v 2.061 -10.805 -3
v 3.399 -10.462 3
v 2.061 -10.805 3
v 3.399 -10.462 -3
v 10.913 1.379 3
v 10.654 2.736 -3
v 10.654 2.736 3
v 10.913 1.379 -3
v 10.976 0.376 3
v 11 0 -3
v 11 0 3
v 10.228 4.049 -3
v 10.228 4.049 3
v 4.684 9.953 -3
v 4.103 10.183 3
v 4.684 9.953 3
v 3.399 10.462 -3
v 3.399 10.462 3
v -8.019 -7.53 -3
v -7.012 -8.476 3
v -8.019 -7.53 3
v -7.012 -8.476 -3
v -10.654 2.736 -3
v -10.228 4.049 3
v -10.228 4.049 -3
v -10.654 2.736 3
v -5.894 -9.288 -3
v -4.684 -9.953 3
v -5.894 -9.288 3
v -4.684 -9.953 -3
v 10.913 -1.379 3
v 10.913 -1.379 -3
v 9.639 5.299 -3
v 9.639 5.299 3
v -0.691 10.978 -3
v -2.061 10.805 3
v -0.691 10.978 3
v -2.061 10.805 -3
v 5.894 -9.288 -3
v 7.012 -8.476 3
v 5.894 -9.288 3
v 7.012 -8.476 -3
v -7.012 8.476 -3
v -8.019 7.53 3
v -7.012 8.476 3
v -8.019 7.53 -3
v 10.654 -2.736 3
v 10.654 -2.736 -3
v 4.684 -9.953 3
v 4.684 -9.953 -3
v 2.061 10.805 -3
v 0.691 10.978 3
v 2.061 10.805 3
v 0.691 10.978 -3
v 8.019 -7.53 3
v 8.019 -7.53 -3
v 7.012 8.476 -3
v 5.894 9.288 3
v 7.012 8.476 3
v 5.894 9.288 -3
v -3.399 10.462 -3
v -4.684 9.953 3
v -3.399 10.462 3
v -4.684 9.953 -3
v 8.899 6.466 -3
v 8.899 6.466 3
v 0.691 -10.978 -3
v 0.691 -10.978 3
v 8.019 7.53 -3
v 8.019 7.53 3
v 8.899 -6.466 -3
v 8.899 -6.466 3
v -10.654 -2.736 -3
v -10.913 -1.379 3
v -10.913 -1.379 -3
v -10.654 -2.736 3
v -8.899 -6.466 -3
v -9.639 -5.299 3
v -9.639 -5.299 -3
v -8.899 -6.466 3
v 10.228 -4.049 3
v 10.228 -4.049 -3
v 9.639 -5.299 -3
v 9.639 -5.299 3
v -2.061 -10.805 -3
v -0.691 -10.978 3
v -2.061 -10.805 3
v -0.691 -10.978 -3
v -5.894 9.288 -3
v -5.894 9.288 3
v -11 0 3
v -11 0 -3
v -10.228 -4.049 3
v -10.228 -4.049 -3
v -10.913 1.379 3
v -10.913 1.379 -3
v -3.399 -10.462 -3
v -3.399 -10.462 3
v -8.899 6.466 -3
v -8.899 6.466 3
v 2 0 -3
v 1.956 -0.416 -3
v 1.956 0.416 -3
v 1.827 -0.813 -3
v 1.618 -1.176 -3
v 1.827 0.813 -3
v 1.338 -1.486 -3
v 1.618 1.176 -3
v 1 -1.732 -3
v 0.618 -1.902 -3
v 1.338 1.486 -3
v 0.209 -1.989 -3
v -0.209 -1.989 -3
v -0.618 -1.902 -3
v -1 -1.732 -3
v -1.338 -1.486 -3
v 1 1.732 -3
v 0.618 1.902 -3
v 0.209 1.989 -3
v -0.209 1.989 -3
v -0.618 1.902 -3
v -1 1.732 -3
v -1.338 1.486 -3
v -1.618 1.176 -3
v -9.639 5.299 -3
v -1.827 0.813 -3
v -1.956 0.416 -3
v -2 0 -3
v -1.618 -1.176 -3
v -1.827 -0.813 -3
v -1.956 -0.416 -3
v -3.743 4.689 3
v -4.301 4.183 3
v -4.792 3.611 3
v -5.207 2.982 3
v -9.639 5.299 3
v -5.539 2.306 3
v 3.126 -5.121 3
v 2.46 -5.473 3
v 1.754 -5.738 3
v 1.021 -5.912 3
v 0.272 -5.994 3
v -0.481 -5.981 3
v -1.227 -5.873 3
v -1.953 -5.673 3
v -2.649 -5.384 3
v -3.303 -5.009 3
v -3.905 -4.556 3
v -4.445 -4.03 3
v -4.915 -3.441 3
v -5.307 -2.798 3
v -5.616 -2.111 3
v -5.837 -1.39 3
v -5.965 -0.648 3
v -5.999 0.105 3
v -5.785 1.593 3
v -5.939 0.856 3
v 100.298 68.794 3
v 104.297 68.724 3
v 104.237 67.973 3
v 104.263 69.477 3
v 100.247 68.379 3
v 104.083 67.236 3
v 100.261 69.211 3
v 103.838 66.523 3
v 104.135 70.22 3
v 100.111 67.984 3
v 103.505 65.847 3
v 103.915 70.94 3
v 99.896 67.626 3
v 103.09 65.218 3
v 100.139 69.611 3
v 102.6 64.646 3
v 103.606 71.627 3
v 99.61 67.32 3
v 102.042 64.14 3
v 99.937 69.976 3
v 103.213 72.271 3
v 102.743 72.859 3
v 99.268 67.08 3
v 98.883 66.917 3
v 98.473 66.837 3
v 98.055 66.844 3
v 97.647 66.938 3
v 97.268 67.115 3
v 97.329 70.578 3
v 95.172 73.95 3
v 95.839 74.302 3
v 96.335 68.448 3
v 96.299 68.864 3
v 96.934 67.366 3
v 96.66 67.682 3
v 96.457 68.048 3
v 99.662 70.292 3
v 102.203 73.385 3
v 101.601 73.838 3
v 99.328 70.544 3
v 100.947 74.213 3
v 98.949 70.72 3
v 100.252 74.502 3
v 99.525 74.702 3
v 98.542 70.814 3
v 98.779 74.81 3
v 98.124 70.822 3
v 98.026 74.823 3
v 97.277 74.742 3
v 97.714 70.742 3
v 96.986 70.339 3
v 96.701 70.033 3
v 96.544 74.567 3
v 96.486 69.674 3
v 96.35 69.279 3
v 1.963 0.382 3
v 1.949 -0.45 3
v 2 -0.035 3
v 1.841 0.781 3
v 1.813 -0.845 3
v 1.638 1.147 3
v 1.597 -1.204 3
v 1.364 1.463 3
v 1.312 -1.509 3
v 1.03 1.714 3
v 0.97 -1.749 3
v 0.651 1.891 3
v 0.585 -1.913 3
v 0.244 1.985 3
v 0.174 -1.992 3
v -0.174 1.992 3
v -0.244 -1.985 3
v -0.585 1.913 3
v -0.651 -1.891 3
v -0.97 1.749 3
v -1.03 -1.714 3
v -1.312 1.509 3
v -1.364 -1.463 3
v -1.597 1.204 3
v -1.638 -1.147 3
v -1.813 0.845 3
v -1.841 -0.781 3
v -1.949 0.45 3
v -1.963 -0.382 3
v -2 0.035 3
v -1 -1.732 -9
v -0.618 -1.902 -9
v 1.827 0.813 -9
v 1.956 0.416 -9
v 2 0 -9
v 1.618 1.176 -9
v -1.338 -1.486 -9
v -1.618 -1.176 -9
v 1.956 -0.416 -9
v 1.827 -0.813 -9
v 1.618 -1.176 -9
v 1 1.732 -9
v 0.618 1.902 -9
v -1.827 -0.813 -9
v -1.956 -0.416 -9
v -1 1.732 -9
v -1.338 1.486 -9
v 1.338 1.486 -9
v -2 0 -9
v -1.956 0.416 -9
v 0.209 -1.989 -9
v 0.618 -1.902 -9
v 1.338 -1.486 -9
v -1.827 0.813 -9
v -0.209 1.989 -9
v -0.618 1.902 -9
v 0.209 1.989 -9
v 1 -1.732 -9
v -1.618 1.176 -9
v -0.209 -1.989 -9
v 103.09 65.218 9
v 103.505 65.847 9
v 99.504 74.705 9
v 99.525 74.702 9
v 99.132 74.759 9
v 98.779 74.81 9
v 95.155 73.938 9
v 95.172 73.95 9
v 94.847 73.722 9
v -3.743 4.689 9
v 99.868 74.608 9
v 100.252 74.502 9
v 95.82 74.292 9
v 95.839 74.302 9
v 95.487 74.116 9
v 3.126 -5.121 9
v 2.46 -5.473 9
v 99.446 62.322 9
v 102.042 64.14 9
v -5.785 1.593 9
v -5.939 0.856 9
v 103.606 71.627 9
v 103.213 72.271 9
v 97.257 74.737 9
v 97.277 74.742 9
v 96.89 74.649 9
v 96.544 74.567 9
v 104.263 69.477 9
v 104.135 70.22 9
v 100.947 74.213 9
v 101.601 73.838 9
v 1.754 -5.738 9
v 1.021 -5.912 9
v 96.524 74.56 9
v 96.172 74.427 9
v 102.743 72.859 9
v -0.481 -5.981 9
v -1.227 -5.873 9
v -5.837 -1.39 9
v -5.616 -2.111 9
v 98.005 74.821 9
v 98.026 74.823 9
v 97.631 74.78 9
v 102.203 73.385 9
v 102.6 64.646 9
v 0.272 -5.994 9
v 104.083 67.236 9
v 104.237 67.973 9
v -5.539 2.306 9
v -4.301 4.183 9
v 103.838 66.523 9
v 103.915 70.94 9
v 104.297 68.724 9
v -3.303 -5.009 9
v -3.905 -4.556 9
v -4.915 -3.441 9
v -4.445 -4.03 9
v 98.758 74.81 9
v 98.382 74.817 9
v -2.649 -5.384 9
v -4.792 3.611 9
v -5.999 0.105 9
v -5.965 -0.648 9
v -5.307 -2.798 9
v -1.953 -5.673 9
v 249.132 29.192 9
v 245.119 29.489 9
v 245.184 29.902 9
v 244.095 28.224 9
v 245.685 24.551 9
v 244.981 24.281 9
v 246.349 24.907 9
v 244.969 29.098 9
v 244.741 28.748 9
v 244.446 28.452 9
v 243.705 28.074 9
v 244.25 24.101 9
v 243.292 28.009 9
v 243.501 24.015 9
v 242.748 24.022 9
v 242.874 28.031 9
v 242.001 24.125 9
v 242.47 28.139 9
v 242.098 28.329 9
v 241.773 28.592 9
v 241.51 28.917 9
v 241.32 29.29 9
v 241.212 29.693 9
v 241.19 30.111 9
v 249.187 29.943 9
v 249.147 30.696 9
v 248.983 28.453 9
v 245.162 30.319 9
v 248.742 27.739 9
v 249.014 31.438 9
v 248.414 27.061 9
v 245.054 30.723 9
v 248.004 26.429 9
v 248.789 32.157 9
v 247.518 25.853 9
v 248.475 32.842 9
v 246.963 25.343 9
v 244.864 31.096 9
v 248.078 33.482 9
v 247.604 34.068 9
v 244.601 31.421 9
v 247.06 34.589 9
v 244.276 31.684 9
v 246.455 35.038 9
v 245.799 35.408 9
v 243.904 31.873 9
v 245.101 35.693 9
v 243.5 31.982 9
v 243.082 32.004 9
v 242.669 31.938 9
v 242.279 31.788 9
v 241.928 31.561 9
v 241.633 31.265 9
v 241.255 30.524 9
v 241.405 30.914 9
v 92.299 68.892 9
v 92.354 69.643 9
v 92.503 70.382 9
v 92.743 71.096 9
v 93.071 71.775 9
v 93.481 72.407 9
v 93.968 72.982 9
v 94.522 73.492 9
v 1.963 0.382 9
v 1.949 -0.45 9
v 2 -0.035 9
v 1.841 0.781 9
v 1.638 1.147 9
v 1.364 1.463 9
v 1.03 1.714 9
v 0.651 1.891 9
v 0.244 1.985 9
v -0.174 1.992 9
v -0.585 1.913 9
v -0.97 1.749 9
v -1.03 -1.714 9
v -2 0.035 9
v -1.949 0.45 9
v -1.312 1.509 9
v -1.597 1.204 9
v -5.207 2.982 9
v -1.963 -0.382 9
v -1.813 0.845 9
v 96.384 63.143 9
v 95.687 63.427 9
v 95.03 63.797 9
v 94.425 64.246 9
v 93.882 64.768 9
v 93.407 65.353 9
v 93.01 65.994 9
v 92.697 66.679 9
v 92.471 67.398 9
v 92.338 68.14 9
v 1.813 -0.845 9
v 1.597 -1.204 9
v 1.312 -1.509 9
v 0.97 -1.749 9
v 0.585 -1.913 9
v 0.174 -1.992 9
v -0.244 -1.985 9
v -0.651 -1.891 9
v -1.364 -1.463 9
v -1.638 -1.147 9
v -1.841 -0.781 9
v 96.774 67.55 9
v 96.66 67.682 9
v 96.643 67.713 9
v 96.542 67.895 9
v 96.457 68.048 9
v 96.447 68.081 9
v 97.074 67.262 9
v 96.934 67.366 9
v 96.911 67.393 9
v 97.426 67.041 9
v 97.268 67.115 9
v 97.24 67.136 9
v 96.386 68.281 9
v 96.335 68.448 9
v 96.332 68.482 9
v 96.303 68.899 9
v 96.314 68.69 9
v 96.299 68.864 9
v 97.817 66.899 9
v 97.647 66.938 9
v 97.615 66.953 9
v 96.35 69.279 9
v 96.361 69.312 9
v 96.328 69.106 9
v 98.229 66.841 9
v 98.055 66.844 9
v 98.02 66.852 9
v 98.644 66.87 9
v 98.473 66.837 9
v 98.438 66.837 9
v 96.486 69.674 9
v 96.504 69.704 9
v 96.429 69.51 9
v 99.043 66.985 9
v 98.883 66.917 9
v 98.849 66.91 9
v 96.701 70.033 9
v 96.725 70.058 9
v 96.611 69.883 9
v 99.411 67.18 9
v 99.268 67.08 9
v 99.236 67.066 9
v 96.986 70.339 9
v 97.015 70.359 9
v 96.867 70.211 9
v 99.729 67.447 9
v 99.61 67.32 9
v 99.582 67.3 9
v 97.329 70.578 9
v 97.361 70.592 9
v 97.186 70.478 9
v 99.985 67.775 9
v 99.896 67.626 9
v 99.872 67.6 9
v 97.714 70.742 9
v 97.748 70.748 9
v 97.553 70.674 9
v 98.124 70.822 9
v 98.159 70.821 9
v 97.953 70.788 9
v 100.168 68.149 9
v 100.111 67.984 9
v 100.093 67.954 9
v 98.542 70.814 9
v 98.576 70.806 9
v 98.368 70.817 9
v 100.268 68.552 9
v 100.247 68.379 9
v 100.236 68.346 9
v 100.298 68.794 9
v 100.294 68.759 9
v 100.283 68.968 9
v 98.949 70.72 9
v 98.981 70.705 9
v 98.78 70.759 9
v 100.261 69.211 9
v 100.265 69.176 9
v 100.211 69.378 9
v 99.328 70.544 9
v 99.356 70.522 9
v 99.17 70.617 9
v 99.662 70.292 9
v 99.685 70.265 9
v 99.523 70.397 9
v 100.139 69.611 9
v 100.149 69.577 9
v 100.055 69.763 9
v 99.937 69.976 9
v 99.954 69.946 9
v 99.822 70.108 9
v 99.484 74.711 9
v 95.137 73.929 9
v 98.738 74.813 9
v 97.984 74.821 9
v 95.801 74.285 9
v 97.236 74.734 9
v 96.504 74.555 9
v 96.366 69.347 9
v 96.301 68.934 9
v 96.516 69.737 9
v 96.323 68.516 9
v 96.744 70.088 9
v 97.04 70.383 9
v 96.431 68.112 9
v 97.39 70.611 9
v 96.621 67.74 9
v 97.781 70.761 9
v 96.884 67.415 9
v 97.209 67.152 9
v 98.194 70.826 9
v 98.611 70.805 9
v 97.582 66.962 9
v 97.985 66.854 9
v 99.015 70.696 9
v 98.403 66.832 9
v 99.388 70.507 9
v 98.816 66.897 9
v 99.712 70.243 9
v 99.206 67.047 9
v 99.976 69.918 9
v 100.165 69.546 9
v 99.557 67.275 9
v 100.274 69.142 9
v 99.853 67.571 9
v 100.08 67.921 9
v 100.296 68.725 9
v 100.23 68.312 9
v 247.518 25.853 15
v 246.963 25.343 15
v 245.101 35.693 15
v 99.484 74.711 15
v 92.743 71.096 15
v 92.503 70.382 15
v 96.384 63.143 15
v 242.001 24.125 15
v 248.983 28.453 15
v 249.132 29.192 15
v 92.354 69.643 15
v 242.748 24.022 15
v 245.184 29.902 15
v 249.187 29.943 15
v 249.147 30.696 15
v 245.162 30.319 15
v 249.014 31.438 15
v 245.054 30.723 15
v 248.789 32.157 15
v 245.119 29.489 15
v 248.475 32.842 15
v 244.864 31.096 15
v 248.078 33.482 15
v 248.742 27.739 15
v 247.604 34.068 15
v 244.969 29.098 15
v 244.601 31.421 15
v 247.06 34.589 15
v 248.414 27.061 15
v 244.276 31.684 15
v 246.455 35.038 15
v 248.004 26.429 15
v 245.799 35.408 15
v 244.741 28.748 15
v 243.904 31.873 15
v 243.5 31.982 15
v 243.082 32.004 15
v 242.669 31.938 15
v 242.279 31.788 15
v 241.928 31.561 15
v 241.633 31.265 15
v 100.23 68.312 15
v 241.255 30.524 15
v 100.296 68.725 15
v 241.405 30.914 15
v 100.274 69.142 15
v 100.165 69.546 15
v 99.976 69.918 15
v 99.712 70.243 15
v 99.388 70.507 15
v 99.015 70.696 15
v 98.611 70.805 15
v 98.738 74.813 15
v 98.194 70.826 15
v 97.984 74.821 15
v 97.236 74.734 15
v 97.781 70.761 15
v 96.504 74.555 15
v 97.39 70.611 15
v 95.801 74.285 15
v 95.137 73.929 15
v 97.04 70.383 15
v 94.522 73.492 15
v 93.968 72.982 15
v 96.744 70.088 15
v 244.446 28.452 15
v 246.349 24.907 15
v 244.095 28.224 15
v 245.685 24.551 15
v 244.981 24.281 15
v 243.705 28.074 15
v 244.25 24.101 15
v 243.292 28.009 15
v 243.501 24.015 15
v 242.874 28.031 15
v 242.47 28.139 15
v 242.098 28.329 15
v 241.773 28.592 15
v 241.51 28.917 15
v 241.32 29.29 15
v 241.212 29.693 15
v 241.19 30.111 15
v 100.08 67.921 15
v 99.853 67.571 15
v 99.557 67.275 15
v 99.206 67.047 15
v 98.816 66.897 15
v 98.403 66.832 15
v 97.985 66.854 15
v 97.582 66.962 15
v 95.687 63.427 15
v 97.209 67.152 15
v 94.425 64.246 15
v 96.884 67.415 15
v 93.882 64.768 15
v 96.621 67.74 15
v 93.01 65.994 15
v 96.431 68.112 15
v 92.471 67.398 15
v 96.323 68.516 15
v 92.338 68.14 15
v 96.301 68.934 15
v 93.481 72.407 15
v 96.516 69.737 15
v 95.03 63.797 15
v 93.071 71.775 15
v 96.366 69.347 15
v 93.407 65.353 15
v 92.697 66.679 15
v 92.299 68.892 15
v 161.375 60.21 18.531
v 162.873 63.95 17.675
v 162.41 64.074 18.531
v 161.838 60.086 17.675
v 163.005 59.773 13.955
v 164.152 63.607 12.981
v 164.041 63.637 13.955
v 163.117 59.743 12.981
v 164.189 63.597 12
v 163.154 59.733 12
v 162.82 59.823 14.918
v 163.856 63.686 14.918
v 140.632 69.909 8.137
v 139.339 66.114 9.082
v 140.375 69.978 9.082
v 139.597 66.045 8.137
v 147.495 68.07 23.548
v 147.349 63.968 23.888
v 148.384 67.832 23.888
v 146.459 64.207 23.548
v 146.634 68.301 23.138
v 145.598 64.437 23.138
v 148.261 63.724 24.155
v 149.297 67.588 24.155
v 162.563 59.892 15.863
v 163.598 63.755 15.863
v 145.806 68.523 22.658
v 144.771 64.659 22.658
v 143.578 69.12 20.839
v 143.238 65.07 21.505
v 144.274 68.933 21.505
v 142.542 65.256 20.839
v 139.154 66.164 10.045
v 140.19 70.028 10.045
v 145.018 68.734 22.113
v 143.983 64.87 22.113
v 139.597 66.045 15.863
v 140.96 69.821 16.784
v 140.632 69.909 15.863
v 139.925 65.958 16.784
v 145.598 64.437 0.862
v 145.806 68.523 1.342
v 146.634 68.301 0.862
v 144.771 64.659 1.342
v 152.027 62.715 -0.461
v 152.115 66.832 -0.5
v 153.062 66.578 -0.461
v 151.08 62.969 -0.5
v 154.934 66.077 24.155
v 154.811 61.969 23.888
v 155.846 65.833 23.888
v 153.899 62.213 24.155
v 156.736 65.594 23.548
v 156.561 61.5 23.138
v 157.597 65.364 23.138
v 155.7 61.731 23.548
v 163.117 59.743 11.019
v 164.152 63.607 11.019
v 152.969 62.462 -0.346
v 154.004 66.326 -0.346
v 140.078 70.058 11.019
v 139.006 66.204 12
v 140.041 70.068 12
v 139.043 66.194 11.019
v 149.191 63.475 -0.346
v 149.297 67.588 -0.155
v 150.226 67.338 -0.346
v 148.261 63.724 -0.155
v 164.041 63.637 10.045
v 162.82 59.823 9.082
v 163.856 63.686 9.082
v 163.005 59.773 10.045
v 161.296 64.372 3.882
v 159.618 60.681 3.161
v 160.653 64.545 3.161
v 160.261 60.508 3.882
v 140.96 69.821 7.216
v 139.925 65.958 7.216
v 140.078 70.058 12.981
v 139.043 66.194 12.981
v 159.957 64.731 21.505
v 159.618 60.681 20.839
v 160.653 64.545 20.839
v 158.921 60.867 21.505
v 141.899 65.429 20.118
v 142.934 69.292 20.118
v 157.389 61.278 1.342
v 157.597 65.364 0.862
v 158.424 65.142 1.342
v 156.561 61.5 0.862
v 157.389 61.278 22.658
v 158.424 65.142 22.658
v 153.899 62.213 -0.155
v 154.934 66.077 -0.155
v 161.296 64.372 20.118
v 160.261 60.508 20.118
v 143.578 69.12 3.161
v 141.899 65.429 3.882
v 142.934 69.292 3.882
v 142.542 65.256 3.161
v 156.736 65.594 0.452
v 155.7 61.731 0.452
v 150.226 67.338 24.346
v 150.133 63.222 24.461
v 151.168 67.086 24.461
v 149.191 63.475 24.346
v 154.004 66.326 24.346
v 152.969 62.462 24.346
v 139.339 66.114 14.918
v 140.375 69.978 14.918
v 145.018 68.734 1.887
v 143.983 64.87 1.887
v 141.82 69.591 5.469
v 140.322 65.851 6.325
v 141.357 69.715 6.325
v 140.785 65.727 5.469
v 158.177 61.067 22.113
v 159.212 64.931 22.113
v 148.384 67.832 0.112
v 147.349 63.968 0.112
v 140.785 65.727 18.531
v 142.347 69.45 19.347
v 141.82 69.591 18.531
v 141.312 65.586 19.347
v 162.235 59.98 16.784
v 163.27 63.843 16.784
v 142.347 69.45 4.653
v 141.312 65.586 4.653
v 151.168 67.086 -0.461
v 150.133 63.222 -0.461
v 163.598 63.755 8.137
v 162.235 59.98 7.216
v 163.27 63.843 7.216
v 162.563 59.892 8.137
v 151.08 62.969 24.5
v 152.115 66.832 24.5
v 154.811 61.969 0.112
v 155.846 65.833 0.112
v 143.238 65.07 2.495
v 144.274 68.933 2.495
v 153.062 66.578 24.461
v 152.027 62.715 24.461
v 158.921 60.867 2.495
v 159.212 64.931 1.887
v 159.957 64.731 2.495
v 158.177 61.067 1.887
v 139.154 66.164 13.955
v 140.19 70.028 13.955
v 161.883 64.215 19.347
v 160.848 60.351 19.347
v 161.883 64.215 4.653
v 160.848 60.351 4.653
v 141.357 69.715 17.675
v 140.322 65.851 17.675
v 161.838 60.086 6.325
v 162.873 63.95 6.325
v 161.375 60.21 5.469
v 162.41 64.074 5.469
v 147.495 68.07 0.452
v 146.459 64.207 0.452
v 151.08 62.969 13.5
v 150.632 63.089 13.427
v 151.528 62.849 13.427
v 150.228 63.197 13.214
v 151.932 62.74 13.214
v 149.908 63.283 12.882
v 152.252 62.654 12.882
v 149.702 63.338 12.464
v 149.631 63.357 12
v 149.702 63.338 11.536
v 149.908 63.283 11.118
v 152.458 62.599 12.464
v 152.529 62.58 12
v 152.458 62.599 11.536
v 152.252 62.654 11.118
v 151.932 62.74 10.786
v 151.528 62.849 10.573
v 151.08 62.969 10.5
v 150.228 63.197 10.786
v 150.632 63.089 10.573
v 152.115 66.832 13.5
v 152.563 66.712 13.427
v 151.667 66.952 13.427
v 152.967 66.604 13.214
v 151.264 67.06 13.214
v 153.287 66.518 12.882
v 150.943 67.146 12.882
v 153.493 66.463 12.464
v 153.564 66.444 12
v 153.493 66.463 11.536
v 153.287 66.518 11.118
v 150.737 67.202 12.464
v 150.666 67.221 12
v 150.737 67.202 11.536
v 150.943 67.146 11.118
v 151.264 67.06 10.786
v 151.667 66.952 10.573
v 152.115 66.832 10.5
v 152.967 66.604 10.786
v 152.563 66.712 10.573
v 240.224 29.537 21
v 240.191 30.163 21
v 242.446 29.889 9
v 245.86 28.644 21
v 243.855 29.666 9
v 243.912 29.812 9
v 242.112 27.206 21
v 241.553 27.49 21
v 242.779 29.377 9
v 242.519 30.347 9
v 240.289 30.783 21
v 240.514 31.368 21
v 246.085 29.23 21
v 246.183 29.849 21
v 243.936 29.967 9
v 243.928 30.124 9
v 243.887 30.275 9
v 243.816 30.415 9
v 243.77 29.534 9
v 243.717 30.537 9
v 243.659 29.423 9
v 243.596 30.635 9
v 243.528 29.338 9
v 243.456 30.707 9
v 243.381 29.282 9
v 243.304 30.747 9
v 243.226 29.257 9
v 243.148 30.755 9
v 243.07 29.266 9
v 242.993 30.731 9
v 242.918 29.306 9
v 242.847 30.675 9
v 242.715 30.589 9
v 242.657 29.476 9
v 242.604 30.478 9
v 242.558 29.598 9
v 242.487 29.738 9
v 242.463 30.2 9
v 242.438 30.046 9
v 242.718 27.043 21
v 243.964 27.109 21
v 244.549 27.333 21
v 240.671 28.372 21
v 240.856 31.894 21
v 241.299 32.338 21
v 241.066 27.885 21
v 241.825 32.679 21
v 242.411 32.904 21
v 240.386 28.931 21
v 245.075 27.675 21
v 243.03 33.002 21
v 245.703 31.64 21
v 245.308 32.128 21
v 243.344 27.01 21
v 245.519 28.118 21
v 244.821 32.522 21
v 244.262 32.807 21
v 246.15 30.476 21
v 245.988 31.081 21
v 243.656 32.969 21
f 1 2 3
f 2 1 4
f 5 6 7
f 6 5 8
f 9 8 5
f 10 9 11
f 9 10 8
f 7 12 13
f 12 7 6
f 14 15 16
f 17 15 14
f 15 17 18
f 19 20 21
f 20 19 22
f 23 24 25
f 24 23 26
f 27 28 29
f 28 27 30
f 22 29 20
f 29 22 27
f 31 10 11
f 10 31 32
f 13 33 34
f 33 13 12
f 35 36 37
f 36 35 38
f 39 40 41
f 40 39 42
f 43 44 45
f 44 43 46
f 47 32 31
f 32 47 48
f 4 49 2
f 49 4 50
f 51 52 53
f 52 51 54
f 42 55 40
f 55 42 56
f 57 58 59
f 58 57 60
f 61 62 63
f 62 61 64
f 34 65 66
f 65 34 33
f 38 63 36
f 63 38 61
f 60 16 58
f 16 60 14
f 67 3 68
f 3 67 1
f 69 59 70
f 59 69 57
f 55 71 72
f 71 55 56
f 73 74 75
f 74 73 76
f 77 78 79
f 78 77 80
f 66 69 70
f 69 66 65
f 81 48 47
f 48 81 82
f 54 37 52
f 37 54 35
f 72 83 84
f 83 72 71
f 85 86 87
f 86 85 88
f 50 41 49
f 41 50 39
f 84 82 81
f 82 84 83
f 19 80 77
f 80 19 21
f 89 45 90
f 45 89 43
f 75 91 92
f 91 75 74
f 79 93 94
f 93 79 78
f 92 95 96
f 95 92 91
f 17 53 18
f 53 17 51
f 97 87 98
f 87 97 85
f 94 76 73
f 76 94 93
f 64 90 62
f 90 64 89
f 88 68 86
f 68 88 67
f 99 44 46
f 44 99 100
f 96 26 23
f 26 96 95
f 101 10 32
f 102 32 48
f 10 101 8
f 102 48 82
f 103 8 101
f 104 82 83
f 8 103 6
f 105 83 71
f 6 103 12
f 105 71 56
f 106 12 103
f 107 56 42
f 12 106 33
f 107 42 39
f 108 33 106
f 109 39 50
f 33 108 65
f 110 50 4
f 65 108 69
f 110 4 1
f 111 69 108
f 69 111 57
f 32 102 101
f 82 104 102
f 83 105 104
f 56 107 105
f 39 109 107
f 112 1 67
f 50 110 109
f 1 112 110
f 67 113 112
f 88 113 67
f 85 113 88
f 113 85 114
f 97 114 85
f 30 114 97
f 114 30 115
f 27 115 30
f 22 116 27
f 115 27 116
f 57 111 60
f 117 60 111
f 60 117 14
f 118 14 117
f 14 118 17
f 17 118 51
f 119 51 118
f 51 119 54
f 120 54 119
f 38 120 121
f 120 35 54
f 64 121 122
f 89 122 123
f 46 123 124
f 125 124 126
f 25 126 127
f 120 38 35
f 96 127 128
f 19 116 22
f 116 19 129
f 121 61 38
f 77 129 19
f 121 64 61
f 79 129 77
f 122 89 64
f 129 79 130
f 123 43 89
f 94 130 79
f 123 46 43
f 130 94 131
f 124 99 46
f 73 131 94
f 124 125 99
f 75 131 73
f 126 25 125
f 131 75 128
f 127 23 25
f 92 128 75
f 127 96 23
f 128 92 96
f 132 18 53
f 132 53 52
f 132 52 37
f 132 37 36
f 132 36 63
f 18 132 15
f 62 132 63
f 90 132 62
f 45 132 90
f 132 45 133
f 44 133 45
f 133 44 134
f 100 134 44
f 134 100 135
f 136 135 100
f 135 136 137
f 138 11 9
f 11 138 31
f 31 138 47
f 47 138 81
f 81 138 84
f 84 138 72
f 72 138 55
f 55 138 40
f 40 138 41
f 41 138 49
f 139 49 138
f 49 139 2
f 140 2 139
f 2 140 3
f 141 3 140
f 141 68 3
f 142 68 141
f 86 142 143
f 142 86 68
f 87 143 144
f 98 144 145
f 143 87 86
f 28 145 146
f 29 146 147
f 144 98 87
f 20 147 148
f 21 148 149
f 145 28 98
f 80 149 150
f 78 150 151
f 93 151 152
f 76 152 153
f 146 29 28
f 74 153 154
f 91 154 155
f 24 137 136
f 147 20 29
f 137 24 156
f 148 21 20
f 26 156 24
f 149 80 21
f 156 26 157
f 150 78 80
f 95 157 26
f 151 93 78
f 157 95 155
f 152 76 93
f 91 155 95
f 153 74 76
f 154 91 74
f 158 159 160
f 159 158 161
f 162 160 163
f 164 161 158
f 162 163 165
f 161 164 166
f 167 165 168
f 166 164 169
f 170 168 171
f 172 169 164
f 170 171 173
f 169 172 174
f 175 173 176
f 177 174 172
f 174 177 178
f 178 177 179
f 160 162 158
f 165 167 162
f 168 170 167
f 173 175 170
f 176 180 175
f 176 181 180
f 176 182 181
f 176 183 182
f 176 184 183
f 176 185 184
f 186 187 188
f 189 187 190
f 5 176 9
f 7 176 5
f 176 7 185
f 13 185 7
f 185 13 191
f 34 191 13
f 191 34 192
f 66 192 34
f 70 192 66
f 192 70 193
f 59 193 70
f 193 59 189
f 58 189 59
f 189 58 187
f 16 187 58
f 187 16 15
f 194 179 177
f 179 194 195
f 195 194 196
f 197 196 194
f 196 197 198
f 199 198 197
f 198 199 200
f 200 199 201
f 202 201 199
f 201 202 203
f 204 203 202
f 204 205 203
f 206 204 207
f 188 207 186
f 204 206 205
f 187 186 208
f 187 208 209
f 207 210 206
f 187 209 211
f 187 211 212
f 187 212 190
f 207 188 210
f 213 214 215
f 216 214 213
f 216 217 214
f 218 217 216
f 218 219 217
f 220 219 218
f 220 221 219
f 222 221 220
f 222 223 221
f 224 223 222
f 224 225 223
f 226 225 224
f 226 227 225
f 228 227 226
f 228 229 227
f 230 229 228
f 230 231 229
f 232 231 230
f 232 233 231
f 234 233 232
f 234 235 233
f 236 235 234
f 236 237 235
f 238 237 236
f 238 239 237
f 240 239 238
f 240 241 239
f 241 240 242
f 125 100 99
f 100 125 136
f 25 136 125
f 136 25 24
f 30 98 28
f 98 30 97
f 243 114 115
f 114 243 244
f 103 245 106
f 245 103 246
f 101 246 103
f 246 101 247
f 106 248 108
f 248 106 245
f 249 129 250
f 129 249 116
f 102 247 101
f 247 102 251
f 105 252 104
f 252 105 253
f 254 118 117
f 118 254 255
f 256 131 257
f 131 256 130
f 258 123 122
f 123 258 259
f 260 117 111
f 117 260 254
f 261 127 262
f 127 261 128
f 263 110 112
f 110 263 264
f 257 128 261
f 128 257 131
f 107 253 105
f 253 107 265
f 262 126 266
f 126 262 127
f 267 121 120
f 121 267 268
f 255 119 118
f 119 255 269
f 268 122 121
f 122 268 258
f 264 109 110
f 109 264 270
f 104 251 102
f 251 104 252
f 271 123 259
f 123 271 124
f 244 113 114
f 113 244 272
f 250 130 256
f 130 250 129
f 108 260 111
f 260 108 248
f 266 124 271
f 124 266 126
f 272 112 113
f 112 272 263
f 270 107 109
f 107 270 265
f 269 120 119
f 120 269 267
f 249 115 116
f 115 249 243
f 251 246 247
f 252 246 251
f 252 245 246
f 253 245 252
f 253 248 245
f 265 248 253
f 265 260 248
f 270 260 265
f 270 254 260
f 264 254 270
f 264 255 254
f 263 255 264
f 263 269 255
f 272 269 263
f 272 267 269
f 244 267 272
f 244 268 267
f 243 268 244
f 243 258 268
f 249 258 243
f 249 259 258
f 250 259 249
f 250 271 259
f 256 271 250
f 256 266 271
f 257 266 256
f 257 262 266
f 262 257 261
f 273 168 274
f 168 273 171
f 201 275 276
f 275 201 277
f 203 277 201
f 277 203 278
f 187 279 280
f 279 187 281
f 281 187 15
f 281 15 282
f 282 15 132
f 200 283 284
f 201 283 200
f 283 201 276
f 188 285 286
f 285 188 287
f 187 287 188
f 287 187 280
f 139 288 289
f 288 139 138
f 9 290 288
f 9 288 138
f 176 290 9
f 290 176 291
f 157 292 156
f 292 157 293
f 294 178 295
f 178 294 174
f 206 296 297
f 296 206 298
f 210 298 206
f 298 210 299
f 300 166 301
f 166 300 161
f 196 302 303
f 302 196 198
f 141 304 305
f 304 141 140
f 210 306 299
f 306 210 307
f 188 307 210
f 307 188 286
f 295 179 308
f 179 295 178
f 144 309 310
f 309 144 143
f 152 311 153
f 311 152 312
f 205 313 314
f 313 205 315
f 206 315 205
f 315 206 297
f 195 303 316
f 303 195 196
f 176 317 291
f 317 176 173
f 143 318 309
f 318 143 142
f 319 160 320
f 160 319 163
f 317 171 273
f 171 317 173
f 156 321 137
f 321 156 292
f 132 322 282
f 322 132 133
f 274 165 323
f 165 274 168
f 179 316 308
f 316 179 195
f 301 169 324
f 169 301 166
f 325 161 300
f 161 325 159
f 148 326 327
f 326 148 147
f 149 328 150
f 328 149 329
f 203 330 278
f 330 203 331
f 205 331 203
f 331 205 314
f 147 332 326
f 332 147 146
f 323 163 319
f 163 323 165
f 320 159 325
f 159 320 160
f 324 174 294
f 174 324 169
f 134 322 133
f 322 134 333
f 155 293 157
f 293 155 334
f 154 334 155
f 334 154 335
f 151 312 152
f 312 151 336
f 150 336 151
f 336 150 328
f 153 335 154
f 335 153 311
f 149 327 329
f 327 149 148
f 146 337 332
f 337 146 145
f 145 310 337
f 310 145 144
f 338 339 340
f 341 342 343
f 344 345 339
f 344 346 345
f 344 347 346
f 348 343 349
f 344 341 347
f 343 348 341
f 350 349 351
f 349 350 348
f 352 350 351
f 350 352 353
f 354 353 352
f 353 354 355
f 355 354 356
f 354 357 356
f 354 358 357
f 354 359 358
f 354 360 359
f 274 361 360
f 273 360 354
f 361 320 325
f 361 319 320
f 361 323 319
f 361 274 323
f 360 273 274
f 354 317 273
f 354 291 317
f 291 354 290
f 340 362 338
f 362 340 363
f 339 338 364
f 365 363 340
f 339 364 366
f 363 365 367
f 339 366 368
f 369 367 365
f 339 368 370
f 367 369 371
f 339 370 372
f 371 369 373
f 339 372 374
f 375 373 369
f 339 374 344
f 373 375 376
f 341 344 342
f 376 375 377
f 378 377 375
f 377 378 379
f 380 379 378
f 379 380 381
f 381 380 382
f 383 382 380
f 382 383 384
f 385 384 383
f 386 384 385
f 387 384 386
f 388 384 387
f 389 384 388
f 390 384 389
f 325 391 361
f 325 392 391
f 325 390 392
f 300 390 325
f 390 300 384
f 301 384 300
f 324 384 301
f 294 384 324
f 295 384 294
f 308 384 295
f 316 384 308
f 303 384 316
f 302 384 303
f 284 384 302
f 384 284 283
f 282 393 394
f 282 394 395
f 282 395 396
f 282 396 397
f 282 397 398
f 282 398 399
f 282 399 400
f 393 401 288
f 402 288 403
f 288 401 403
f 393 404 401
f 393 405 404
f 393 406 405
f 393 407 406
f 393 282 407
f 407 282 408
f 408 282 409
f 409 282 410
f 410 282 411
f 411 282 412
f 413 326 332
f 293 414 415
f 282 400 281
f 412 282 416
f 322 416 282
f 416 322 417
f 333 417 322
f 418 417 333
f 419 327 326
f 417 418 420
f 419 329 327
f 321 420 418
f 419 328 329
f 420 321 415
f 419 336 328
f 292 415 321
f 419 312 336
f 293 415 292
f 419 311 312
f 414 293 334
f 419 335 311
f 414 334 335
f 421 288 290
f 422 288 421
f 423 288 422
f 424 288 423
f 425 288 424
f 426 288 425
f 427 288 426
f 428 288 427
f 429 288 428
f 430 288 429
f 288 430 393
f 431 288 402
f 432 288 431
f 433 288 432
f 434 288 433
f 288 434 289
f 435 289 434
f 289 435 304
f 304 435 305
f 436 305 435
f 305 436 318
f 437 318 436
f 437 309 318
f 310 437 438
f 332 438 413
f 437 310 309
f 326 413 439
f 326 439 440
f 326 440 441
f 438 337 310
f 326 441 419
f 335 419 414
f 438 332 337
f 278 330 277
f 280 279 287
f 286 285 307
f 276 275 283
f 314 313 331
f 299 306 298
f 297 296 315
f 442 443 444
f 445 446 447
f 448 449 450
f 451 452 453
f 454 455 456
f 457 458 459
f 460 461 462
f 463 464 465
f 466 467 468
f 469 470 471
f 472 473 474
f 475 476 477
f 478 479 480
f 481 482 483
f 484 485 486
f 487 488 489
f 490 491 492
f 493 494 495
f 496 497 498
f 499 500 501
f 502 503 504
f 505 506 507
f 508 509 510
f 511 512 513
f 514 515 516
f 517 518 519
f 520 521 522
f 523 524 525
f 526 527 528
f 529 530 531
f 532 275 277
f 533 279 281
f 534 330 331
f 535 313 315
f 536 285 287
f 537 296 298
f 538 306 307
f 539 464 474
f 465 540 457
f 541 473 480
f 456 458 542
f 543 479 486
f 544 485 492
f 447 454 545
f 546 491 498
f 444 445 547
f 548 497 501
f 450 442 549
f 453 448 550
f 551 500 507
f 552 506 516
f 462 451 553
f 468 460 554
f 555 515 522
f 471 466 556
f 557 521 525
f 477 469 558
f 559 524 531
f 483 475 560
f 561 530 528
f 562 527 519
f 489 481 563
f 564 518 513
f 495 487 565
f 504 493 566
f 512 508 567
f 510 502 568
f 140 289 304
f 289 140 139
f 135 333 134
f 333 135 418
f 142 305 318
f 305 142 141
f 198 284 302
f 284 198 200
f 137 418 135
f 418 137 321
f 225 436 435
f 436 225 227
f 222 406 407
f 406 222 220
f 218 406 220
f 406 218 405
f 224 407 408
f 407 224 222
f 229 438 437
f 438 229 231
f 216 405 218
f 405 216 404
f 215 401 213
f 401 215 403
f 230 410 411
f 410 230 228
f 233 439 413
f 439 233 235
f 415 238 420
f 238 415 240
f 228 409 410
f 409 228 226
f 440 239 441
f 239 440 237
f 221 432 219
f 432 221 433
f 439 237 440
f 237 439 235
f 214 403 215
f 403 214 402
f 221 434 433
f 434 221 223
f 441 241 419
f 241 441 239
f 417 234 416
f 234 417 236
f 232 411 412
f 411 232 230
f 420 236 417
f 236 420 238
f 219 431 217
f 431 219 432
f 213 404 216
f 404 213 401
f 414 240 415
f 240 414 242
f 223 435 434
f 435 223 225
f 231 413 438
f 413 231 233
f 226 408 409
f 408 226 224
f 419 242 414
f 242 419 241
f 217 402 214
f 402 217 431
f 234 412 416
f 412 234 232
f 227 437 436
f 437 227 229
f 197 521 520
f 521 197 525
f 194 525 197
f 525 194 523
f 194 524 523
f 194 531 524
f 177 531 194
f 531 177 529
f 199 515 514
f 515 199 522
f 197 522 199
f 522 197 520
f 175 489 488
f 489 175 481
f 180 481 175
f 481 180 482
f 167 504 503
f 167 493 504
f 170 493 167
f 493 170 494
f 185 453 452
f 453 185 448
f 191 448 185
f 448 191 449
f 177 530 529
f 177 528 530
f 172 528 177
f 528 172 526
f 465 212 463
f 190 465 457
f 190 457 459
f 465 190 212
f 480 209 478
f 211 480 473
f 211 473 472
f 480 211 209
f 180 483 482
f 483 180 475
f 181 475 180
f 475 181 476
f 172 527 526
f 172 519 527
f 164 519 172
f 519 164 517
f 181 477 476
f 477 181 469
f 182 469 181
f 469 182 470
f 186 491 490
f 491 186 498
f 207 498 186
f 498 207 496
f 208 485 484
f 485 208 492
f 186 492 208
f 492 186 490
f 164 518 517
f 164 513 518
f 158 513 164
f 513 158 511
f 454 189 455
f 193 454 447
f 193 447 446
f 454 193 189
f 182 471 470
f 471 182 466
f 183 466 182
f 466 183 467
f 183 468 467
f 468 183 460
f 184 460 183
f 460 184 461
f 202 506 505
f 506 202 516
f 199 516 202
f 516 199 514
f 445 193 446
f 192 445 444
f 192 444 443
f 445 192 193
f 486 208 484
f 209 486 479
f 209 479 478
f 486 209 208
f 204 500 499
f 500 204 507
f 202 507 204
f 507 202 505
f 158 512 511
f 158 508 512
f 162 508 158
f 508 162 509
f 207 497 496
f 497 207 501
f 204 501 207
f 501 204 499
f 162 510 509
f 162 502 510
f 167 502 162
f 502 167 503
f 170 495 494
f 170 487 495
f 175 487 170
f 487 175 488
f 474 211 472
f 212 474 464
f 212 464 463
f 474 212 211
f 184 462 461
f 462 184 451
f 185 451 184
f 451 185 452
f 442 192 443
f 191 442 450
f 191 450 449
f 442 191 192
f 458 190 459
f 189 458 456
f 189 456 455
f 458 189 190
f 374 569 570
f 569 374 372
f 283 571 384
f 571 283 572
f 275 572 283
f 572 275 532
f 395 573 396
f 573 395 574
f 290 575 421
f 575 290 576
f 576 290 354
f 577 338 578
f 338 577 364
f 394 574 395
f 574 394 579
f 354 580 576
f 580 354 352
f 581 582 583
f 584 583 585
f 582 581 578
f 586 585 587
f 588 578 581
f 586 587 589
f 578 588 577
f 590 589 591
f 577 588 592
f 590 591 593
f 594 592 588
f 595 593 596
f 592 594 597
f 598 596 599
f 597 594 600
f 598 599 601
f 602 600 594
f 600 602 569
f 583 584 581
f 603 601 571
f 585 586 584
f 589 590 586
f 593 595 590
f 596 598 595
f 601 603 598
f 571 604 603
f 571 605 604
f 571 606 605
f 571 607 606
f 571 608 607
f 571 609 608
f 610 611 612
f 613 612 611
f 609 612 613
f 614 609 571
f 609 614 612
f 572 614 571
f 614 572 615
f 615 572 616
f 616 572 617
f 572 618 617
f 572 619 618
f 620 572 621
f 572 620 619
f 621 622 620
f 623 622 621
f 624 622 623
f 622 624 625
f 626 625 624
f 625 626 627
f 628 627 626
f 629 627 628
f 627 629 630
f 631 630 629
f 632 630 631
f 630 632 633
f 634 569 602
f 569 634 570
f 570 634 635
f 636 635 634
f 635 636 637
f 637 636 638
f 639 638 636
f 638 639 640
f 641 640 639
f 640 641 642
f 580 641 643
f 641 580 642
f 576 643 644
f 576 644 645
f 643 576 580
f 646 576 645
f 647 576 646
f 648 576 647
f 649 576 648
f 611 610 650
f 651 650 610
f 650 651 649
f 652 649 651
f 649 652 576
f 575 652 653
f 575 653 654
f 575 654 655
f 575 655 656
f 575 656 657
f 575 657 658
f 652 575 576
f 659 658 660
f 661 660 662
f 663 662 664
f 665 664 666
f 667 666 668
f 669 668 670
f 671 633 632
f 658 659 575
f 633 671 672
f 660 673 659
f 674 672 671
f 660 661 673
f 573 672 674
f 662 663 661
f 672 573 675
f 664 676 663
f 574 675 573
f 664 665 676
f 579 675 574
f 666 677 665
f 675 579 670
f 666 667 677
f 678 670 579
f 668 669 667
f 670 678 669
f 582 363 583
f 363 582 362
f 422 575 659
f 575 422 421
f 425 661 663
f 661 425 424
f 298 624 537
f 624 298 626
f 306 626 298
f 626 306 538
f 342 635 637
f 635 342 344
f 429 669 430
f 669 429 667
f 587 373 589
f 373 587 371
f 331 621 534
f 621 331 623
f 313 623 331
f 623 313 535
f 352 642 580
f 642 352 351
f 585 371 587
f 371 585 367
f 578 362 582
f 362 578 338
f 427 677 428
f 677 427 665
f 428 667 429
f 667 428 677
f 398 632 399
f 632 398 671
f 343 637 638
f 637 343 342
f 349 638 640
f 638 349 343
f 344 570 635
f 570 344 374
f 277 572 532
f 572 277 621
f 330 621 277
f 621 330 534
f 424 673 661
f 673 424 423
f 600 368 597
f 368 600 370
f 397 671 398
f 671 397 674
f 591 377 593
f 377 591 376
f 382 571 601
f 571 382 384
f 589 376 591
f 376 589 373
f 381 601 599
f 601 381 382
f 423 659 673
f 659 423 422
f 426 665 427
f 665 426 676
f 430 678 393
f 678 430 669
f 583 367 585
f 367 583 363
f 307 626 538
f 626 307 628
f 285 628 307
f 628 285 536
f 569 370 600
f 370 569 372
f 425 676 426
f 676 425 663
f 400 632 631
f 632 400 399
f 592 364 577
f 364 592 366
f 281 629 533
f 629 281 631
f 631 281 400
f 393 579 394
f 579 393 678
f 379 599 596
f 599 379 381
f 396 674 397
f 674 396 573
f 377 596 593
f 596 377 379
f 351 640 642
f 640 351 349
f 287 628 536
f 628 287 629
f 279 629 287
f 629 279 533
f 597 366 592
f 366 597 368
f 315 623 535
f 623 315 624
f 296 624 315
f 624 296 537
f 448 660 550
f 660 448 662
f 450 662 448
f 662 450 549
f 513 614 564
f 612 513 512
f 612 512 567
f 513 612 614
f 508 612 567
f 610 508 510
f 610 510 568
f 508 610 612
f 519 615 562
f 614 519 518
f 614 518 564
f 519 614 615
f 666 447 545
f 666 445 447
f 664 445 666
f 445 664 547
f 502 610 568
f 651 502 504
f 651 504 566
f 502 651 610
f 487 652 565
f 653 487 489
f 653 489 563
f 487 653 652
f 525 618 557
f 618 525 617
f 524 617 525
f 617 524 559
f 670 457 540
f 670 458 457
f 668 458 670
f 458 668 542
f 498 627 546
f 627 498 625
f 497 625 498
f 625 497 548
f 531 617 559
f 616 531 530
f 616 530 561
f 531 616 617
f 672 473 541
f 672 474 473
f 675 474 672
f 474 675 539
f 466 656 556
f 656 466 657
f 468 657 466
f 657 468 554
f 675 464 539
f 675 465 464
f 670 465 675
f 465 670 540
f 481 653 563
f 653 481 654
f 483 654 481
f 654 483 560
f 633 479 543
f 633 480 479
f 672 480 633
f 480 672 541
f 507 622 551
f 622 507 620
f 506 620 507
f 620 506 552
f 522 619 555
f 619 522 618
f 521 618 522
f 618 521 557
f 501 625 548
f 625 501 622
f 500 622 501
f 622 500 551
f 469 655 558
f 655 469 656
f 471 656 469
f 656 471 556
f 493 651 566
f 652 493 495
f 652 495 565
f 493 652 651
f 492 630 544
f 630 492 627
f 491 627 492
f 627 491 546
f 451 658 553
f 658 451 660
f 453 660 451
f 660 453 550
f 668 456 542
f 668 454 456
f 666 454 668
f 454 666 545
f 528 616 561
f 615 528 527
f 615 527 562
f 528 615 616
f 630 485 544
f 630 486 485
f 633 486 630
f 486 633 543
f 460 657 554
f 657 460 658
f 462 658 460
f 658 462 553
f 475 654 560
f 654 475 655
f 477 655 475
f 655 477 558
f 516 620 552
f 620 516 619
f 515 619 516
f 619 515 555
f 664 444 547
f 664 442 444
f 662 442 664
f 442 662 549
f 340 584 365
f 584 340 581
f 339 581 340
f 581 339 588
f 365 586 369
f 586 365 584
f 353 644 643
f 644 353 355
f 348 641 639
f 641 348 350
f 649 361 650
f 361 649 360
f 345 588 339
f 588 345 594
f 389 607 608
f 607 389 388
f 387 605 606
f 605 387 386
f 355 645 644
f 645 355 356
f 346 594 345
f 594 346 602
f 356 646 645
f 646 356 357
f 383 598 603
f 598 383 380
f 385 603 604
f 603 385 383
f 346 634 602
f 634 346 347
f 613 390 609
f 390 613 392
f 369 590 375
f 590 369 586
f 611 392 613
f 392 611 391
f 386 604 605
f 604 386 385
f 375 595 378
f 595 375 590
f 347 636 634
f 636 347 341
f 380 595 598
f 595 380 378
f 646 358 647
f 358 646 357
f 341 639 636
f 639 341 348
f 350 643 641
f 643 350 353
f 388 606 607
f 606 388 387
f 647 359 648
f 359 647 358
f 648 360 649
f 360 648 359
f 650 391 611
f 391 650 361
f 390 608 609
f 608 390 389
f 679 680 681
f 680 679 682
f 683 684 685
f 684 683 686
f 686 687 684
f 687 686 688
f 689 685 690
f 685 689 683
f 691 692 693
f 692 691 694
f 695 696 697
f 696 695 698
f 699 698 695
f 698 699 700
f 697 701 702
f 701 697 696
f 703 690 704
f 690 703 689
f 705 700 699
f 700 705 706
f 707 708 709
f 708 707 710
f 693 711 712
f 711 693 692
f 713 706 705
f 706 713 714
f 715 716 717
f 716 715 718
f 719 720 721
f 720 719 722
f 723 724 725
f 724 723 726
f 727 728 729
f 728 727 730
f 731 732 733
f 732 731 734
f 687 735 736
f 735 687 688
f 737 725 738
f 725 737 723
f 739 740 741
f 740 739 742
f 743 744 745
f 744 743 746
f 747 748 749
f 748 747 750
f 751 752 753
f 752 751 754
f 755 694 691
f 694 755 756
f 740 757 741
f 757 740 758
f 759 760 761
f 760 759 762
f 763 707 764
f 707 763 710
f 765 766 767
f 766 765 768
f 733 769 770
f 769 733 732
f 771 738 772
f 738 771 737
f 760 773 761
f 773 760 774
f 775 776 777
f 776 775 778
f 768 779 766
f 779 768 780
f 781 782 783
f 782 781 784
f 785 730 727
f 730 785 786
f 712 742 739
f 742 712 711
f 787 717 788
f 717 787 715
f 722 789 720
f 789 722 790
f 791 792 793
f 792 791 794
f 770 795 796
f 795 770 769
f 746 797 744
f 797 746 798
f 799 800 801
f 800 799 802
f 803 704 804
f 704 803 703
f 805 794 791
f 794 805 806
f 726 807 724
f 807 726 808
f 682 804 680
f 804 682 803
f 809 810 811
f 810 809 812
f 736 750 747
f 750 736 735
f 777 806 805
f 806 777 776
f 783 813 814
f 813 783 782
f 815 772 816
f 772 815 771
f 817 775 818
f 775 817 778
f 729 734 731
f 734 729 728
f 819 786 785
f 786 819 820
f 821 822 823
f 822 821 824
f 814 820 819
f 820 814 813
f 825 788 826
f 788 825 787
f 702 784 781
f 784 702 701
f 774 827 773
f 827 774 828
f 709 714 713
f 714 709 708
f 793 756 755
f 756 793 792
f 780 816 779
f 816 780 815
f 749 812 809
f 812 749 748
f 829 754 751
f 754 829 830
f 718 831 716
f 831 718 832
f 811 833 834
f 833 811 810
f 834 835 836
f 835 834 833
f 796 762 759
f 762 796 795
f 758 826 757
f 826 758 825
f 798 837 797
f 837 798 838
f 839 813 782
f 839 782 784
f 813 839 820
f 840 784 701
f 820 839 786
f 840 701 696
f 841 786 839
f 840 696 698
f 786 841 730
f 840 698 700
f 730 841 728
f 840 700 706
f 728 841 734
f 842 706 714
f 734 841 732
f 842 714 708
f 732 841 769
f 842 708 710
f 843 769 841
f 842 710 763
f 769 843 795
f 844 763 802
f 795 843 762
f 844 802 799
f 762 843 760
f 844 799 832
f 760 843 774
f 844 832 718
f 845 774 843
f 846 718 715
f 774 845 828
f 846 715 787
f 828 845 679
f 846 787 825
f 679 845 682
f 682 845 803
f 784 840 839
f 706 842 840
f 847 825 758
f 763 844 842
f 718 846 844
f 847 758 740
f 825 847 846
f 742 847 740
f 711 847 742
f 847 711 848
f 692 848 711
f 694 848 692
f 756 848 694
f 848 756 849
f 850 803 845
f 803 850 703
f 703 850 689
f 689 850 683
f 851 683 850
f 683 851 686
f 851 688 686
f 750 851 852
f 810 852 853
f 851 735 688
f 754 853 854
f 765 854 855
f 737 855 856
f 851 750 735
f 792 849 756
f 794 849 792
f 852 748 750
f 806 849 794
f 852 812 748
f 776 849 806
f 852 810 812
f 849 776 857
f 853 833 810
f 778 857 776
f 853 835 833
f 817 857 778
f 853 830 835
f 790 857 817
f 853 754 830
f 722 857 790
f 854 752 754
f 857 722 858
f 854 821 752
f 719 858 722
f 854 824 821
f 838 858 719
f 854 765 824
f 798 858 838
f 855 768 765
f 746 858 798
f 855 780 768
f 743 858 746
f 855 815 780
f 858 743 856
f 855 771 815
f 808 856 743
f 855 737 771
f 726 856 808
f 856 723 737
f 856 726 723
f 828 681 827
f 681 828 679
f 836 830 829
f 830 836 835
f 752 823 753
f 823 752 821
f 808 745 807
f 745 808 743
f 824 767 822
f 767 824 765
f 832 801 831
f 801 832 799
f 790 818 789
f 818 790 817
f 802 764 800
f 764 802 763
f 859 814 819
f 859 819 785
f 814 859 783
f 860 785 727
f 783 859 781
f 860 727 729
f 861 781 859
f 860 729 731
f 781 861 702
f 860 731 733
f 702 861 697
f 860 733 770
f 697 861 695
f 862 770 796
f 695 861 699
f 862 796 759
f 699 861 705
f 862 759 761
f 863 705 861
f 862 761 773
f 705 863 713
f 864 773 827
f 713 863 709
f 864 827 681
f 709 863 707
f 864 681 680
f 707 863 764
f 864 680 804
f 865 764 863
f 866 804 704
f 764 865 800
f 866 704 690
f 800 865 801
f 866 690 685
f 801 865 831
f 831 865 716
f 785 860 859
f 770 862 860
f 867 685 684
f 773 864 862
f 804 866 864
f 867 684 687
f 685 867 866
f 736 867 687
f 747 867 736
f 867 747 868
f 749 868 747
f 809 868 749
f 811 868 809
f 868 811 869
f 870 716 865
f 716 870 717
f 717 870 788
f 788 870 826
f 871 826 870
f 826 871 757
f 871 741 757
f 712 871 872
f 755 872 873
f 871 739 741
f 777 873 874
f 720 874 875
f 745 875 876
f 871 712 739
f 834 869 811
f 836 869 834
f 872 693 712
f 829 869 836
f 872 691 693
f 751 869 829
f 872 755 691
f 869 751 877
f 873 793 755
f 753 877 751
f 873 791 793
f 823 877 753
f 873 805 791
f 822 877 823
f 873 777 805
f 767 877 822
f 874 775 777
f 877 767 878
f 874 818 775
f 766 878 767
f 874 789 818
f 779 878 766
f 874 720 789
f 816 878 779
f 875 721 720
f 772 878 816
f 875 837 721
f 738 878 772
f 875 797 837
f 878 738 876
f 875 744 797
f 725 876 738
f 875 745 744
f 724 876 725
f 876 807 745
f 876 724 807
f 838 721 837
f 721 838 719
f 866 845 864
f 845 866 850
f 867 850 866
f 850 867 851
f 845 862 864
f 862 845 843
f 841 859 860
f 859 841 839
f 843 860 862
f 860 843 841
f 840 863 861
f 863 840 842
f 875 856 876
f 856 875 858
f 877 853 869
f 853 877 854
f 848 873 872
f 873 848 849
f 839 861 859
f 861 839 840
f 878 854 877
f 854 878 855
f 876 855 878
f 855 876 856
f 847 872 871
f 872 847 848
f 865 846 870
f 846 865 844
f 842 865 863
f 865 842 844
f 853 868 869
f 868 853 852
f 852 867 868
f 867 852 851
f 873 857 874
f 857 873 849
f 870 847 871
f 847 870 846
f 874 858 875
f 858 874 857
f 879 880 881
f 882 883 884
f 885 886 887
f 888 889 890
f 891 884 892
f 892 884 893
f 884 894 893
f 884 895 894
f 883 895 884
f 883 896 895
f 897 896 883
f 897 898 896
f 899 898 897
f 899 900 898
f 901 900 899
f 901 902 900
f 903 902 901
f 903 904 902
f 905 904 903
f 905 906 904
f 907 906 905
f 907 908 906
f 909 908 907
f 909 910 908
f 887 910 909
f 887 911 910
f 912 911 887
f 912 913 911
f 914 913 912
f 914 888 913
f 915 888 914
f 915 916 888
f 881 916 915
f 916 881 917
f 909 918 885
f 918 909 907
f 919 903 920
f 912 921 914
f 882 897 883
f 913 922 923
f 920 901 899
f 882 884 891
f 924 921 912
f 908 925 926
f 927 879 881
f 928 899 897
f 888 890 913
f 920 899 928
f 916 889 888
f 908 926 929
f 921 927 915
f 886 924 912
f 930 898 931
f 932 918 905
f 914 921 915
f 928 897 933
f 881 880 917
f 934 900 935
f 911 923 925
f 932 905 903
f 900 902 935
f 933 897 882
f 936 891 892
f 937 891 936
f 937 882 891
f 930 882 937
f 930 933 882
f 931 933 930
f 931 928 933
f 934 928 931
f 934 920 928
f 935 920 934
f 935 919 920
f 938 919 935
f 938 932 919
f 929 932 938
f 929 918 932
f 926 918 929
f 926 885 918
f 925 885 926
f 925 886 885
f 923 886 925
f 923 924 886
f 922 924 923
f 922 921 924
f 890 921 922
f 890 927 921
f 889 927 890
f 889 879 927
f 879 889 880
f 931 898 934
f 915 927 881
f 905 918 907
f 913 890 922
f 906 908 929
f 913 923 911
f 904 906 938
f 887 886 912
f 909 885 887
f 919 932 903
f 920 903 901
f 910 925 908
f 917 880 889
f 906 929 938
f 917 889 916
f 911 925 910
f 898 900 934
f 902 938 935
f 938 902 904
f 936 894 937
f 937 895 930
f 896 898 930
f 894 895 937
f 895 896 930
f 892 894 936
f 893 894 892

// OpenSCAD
// Conceptueel model van een Polaire Planimeter (Amsler-type)
// Configureerbaar voor 3D-printen of mechanische visualisatie

// Parameters
poolarm_lengte = 120;
meetarm_lengte = 150;
arm_dikte = 6;
arm_breedte = 12;
wiel_diameter = 25;
wiel_dikte = 4;

// Hoekinstellingen voor de visualisatie
hoek_pool = 35;
hoek_meet = -50;

module as_gat() {
    cylinder(h=arm_dikte+4, d=4, center=true, $fn=30);
}

module pool_anker() {
    // Vast draaipunt (de pool) die op het papier blijft staan
    cylinder(h=arm_dikte, d=22, center=true, $fn=50);
    translate([0, 0, -arm_dikte]) cylinder(h=arm_dikte, d=4, center=true, $fn=30); // Pin
}

module mechanische_arm(lengte) {
    difference() {
        hull() {
            cylinder(h=arm_dikte, d=arm_breedte, center=true, $fn=50);
            translate([lengte, 0, 0]) cylinder(h=arm_dikte, d=arm_breedte, center=true, $fn=50);
        }
        // Scharniergaten
        as_gat();
        translate([lengte, 0, 0]) as_gat();
    }
}

module meetwiel() {
    // Het wiel dat de loodrechte verplaatsing discreet integreert
    rotate([90, 0, 0]) {
        difference() {
            cylinder(h=wiel_dikte, d=wiel_diameter, center=true, $fn=80);
            // Asgat voor het wiel
            cylinder(h=wiel_dikte+2, d=3, center=true, $fn=20);
        }
    }
}

module traceerpunt() {
    // Het vizier waarmee de cartografische contouren worden gevolgd
    translate([0, 0, -arm_dikte/2])
        cylinder(h=12, d1=1.5, d2=6, center=false, $fn=30);
}

// ---- Samenstelling van de Planimeter ----

color("SlateGray") pool_anker();

// Eerste segment: De Poolarm
rotate([0, 0, hoek_pool]) {
    color("Silver") translate([0, 0, arm_dikte]) mechanische_arm(poolarm_lengte);
    
    // Het scharnierpunt
    translate([poolarm_lengte, 0, arm_dikte]) {
        
        // Tweede segment: De Meetarm
        rotate([0, 0, hoek_meet]) {
            color("DimGray") translate([0, 0, arm_dikte]) mechanische_arm(meetarm_lengte);
            
            // Meetwiel bevestigd op de meetarm
            // De positie van het wiel op de arm beïnvloedt de schaalfactor
            color("DarkGoldenrod") 
                translate([meetarm_lengte * 0.35, arm_breedte/2 + wiel_dikte, arm_dikte])
                meetwiel();
                
            // Traceerpunt aan het uiteinde
            color("Black") translate([meetarm_lengte, 0, arm_dikte]) traceerpunt();
        }
    }
}
